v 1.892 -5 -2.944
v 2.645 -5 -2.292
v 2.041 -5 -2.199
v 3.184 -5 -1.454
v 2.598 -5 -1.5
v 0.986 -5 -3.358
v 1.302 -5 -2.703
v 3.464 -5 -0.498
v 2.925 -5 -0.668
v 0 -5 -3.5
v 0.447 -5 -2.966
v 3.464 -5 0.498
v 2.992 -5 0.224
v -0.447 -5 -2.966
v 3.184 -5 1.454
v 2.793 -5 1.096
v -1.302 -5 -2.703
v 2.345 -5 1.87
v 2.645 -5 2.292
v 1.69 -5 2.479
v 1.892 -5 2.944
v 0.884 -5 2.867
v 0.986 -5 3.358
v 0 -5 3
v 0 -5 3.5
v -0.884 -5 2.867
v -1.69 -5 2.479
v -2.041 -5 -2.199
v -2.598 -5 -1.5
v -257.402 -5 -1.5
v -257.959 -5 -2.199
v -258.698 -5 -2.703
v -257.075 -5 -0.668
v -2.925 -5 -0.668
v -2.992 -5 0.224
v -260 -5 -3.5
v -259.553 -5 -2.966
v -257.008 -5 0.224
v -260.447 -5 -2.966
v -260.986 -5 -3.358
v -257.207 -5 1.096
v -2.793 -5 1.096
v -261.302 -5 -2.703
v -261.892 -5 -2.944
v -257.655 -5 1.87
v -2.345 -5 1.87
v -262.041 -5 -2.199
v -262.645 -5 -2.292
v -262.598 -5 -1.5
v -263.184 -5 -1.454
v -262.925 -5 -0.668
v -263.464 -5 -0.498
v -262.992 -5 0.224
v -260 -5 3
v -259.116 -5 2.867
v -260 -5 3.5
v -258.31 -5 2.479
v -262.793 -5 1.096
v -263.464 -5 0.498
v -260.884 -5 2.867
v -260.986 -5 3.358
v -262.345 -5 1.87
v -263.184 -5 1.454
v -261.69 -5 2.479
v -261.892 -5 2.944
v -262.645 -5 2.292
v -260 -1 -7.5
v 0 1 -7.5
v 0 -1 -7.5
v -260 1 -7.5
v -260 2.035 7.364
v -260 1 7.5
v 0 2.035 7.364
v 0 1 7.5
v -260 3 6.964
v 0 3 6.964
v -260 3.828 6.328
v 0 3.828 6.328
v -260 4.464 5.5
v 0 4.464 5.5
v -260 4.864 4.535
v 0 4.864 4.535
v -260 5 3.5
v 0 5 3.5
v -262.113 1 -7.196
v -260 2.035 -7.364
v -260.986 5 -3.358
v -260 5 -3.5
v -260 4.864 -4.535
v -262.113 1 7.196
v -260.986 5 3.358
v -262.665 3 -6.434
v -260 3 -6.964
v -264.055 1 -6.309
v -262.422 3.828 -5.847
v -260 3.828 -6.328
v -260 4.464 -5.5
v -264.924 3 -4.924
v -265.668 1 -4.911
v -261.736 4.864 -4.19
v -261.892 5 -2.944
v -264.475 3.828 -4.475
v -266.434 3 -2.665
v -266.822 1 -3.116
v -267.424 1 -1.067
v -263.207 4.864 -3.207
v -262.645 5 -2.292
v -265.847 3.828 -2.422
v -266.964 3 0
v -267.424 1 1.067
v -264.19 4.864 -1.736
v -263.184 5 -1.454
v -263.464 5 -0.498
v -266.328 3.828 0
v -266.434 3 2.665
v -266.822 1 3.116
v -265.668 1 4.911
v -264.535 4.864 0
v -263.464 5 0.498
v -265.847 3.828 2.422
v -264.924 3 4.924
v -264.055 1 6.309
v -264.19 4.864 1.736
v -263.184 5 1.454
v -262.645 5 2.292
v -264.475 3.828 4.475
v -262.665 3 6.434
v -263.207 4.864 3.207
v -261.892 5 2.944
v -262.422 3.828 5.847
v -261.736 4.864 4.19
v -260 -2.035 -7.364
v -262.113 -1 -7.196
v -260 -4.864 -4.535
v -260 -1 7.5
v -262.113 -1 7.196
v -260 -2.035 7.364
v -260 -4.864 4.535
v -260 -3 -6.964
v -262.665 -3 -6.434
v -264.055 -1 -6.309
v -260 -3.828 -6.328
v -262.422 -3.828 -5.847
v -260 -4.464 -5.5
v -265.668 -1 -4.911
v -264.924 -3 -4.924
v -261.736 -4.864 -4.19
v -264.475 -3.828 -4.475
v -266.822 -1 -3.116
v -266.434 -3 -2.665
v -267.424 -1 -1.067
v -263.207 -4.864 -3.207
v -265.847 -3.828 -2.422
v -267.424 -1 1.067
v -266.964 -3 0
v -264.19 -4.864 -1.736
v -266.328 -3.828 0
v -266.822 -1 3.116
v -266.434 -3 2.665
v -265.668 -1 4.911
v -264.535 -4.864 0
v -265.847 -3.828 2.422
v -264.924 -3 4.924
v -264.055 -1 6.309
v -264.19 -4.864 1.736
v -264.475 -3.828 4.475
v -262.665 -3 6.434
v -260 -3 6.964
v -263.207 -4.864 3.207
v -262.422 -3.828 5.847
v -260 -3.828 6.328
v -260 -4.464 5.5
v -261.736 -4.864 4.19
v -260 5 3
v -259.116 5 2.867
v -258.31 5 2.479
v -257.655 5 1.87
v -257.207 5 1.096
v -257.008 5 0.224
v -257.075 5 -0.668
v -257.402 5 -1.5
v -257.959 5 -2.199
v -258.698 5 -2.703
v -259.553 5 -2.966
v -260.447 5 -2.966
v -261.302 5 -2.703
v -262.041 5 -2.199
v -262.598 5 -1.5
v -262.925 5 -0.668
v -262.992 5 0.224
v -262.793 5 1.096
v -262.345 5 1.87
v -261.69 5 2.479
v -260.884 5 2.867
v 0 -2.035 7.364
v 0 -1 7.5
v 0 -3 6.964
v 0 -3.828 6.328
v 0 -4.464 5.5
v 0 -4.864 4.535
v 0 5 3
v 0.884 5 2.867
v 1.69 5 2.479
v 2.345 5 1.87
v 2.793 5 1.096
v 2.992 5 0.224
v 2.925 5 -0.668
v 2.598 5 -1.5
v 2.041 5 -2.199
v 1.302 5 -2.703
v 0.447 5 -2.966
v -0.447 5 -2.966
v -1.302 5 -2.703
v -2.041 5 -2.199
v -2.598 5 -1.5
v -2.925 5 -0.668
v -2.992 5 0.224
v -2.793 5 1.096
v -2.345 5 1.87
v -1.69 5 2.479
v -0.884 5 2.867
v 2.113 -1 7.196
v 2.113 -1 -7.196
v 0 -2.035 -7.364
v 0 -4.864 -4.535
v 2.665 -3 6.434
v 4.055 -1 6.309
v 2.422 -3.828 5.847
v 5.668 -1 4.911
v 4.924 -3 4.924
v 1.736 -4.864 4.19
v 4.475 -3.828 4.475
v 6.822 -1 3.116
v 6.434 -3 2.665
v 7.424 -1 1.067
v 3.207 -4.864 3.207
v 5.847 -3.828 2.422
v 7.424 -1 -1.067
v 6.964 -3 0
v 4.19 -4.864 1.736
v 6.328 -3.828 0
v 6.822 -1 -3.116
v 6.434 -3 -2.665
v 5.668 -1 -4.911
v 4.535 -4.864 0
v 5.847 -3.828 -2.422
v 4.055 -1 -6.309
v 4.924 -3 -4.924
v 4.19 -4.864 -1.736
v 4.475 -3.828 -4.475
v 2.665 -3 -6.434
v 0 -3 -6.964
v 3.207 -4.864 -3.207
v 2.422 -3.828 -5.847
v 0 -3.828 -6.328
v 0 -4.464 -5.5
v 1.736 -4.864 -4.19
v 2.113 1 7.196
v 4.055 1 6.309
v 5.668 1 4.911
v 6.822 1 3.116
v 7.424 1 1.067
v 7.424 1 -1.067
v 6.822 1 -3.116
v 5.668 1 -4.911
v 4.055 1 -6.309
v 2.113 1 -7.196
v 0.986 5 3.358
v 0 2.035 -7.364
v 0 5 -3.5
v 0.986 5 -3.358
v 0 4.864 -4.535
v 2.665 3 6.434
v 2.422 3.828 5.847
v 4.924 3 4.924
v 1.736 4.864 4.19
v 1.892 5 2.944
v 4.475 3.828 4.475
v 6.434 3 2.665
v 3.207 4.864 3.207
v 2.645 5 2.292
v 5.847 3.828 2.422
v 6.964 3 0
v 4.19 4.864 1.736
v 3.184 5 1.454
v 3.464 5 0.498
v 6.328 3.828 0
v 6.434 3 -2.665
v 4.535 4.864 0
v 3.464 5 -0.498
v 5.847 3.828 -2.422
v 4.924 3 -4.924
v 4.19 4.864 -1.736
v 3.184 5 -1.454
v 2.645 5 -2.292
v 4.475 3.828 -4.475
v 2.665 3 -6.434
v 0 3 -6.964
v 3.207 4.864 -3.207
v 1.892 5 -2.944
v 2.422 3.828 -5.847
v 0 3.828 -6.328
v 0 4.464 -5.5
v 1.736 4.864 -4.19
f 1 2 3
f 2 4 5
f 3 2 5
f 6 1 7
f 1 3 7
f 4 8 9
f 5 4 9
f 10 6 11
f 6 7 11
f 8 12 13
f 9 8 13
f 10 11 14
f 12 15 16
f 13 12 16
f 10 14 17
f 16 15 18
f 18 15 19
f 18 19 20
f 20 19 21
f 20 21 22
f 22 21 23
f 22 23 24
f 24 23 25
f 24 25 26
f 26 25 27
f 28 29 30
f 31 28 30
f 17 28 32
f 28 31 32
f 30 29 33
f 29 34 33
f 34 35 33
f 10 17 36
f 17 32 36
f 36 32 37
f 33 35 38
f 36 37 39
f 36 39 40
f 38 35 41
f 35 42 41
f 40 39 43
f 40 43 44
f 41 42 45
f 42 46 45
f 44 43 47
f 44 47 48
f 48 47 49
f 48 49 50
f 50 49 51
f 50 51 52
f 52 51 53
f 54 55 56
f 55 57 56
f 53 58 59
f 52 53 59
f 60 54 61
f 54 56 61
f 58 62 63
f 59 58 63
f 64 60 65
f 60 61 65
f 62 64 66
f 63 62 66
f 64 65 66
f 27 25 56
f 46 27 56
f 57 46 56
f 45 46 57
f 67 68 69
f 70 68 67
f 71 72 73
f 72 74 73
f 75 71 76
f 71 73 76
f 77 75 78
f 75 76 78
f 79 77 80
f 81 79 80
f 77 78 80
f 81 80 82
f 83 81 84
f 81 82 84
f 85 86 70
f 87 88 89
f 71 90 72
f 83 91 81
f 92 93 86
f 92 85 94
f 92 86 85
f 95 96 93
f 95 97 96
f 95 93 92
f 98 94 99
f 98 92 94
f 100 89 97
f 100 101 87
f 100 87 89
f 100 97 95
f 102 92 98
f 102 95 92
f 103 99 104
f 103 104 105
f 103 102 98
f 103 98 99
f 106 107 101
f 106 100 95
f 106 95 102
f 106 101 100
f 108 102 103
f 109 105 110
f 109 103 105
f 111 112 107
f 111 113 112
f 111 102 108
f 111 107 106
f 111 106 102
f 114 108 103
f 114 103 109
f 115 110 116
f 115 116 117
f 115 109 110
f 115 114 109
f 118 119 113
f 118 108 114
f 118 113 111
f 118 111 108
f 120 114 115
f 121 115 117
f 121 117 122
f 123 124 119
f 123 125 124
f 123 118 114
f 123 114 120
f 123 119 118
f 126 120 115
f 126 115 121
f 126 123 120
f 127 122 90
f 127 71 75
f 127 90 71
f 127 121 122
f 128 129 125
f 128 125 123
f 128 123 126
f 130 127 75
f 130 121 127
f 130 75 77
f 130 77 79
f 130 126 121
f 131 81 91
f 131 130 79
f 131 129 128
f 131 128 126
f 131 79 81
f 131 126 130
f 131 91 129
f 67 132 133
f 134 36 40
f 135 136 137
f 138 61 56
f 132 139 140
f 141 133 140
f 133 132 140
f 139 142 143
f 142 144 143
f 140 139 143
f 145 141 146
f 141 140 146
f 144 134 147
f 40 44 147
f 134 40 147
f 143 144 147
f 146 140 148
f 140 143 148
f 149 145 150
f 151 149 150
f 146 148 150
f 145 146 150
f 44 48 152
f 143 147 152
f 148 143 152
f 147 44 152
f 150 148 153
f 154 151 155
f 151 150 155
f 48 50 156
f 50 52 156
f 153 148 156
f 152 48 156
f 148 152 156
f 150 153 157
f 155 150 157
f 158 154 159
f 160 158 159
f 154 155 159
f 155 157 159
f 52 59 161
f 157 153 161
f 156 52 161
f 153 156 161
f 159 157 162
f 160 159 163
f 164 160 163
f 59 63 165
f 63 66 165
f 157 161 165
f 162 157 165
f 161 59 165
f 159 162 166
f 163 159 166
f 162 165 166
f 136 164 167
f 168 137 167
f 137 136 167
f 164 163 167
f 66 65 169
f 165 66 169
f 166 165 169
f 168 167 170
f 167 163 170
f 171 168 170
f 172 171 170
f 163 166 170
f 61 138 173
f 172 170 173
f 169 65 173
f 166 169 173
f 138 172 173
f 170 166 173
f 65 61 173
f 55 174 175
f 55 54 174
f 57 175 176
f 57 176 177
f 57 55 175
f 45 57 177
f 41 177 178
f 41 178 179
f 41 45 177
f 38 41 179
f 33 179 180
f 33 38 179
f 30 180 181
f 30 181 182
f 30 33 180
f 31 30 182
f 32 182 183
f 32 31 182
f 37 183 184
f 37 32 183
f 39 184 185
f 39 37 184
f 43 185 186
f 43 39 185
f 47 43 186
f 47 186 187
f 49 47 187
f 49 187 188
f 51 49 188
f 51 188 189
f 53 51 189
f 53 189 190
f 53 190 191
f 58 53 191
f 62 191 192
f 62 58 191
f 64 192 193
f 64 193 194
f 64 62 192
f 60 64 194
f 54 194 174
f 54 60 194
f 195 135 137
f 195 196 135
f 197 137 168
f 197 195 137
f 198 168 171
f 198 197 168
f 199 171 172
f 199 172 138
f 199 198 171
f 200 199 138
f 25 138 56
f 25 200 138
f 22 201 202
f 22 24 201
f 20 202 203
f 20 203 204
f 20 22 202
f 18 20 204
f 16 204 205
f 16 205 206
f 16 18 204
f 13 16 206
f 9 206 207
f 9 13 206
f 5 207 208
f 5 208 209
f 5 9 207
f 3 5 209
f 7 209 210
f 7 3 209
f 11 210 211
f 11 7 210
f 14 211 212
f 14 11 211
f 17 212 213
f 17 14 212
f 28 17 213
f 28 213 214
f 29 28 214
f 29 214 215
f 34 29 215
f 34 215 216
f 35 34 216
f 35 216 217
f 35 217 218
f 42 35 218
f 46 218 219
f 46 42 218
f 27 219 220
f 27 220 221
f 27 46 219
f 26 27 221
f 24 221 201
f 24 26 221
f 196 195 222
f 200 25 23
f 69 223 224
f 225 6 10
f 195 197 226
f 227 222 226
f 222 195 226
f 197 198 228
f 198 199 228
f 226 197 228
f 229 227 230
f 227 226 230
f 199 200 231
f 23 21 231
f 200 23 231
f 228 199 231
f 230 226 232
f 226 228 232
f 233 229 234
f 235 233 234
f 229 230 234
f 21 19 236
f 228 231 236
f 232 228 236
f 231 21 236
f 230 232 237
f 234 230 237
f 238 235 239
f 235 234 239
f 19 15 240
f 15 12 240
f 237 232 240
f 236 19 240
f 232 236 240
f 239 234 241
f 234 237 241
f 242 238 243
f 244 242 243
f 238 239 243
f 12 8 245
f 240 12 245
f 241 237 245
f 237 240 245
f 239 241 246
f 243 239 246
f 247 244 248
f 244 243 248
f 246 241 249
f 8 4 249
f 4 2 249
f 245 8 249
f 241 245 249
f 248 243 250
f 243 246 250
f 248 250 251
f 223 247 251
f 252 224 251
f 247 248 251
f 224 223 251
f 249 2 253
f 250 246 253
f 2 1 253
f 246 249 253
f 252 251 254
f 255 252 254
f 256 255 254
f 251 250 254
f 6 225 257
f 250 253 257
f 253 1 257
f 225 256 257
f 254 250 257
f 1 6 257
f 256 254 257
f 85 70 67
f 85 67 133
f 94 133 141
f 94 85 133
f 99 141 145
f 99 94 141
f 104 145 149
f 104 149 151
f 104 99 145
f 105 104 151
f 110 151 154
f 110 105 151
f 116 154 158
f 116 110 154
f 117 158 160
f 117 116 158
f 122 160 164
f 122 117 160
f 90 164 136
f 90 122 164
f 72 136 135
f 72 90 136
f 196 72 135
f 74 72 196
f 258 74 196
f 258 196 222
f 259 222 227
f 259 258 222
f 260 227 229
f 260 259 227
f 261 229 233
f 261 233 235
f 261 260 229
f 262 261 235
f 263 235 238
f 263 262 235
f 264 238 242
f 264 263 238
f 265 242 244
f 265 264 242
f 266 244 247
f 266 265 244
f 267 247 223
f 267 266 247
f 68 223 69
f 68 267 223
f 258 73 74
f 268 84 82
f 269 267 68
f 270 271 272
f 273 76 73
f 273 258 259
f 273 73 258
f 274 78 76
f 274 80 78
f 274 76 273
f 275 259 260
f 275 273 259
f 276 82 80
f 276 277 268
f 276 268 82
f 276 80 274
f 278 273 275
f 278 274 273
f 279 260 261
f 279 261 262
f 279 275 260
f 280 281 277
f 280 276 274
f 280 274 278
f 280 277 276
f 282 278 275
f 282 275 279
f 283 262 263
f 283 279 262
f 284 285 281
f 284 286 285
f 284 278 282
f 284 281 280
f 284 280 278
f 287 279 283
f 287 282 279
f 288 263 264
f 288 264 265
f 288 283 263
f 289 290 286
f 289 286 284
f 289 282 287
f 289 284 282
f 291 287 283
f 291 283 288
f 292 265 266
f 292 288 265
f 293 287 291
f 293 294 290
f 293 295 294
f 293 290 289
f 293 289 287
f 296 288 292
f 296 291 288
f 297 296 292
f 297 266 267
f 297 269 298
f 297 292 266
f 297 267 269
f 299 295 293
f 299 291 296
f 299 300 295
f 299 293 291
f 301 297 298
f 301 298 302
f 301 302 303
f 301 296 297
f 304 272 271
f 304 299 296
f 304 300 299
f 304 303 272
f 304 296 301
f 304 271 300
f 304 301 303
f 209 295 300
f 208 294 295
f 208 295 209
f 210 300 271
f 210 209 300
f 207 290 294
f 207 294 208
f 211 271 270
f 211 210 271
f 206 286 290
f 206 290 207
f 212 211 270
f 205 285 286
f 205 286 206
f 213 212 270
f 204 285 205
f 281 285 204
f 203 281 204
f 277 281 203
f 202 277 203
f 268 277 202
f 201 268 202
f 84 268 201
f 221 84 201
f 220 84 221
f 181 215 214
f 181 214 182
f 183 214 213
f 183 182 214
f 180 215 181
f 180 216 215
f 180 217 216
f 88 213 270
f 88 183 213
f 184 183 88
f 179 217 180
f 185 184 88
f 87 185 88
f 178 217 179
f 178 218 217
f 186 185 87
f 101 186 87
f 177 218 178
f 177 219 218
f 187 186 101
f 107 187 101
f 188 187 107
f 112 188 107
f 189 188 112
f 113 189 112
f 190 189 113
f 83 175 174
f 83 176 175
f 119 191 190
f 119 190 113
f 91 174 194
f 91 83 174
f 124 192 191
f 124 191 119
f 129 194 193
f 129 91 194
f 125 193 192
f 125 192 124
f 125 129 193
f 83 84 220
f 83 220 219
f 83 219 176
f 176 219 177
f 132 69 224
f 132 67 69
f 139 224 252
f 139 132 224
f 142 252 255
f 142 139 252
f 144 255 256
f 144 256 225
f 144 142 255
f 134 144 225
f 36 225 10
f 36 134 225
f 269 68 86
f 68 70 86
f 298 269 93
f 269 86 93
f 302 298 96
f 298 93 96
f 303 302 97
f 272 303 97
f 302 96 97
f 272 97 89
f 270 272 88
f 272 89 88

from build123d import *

# Parameters (mm, degrees)
CROQUIS1_R              = 3
SALIENTE_EXTRUIR1_DEPTH = 5
REDONDEO3_R             = 4


with BuildPart() as part:
    # Croquis1 → Saliente-Extruir1 (new, symmetric)
    with BuildSketch(Plane(origin=(0, 0, 0), x_dir=(-1, 0, 0), z_dir=(0, 1, 0))):
        with BuildLine():
            Line((0, -7.5), (260, -7.5))
            ThreePointArc((260, -7.5), (267.5, 0), (260, 7.5))
            Line((260, 7.5), (0, 7.5))
            ThreePointArc((0, 7.5), (-7.5, 0), (0, -7.5))
        make_face()
        with Locations(Location((0, 0, 0), (0, 0, 90))):
            Circle(CROQUIS1_R, mode=Mode.SUBTRACT)
        with Locations(Location((260, 0, 0), (0, 0, 90))):
            Circle(CROQUIS1_R, mode=Mode.SUBTRACT)
    extrude(amount=SALIENTE_EXTRUIR1_DEPTH, both=True)

    # Redondeo3
    redondeo3_edges = [part.edges().sort_by_distance(p)[0] for p in [
        (7.5, 5, 0),
        (-130, 5, -7.5),
        (-267.5, 5, 0),
        (-130, -5, -7.5),
        (7.5, -5, 0),
        (-130, -5, 7.5),
        (-267.5, -5, 0),
        (-130, 5, 7.5),
    ]]
    fillet(redondeo3_edges, radius=REDONDEO3_R)


solid = part.part
